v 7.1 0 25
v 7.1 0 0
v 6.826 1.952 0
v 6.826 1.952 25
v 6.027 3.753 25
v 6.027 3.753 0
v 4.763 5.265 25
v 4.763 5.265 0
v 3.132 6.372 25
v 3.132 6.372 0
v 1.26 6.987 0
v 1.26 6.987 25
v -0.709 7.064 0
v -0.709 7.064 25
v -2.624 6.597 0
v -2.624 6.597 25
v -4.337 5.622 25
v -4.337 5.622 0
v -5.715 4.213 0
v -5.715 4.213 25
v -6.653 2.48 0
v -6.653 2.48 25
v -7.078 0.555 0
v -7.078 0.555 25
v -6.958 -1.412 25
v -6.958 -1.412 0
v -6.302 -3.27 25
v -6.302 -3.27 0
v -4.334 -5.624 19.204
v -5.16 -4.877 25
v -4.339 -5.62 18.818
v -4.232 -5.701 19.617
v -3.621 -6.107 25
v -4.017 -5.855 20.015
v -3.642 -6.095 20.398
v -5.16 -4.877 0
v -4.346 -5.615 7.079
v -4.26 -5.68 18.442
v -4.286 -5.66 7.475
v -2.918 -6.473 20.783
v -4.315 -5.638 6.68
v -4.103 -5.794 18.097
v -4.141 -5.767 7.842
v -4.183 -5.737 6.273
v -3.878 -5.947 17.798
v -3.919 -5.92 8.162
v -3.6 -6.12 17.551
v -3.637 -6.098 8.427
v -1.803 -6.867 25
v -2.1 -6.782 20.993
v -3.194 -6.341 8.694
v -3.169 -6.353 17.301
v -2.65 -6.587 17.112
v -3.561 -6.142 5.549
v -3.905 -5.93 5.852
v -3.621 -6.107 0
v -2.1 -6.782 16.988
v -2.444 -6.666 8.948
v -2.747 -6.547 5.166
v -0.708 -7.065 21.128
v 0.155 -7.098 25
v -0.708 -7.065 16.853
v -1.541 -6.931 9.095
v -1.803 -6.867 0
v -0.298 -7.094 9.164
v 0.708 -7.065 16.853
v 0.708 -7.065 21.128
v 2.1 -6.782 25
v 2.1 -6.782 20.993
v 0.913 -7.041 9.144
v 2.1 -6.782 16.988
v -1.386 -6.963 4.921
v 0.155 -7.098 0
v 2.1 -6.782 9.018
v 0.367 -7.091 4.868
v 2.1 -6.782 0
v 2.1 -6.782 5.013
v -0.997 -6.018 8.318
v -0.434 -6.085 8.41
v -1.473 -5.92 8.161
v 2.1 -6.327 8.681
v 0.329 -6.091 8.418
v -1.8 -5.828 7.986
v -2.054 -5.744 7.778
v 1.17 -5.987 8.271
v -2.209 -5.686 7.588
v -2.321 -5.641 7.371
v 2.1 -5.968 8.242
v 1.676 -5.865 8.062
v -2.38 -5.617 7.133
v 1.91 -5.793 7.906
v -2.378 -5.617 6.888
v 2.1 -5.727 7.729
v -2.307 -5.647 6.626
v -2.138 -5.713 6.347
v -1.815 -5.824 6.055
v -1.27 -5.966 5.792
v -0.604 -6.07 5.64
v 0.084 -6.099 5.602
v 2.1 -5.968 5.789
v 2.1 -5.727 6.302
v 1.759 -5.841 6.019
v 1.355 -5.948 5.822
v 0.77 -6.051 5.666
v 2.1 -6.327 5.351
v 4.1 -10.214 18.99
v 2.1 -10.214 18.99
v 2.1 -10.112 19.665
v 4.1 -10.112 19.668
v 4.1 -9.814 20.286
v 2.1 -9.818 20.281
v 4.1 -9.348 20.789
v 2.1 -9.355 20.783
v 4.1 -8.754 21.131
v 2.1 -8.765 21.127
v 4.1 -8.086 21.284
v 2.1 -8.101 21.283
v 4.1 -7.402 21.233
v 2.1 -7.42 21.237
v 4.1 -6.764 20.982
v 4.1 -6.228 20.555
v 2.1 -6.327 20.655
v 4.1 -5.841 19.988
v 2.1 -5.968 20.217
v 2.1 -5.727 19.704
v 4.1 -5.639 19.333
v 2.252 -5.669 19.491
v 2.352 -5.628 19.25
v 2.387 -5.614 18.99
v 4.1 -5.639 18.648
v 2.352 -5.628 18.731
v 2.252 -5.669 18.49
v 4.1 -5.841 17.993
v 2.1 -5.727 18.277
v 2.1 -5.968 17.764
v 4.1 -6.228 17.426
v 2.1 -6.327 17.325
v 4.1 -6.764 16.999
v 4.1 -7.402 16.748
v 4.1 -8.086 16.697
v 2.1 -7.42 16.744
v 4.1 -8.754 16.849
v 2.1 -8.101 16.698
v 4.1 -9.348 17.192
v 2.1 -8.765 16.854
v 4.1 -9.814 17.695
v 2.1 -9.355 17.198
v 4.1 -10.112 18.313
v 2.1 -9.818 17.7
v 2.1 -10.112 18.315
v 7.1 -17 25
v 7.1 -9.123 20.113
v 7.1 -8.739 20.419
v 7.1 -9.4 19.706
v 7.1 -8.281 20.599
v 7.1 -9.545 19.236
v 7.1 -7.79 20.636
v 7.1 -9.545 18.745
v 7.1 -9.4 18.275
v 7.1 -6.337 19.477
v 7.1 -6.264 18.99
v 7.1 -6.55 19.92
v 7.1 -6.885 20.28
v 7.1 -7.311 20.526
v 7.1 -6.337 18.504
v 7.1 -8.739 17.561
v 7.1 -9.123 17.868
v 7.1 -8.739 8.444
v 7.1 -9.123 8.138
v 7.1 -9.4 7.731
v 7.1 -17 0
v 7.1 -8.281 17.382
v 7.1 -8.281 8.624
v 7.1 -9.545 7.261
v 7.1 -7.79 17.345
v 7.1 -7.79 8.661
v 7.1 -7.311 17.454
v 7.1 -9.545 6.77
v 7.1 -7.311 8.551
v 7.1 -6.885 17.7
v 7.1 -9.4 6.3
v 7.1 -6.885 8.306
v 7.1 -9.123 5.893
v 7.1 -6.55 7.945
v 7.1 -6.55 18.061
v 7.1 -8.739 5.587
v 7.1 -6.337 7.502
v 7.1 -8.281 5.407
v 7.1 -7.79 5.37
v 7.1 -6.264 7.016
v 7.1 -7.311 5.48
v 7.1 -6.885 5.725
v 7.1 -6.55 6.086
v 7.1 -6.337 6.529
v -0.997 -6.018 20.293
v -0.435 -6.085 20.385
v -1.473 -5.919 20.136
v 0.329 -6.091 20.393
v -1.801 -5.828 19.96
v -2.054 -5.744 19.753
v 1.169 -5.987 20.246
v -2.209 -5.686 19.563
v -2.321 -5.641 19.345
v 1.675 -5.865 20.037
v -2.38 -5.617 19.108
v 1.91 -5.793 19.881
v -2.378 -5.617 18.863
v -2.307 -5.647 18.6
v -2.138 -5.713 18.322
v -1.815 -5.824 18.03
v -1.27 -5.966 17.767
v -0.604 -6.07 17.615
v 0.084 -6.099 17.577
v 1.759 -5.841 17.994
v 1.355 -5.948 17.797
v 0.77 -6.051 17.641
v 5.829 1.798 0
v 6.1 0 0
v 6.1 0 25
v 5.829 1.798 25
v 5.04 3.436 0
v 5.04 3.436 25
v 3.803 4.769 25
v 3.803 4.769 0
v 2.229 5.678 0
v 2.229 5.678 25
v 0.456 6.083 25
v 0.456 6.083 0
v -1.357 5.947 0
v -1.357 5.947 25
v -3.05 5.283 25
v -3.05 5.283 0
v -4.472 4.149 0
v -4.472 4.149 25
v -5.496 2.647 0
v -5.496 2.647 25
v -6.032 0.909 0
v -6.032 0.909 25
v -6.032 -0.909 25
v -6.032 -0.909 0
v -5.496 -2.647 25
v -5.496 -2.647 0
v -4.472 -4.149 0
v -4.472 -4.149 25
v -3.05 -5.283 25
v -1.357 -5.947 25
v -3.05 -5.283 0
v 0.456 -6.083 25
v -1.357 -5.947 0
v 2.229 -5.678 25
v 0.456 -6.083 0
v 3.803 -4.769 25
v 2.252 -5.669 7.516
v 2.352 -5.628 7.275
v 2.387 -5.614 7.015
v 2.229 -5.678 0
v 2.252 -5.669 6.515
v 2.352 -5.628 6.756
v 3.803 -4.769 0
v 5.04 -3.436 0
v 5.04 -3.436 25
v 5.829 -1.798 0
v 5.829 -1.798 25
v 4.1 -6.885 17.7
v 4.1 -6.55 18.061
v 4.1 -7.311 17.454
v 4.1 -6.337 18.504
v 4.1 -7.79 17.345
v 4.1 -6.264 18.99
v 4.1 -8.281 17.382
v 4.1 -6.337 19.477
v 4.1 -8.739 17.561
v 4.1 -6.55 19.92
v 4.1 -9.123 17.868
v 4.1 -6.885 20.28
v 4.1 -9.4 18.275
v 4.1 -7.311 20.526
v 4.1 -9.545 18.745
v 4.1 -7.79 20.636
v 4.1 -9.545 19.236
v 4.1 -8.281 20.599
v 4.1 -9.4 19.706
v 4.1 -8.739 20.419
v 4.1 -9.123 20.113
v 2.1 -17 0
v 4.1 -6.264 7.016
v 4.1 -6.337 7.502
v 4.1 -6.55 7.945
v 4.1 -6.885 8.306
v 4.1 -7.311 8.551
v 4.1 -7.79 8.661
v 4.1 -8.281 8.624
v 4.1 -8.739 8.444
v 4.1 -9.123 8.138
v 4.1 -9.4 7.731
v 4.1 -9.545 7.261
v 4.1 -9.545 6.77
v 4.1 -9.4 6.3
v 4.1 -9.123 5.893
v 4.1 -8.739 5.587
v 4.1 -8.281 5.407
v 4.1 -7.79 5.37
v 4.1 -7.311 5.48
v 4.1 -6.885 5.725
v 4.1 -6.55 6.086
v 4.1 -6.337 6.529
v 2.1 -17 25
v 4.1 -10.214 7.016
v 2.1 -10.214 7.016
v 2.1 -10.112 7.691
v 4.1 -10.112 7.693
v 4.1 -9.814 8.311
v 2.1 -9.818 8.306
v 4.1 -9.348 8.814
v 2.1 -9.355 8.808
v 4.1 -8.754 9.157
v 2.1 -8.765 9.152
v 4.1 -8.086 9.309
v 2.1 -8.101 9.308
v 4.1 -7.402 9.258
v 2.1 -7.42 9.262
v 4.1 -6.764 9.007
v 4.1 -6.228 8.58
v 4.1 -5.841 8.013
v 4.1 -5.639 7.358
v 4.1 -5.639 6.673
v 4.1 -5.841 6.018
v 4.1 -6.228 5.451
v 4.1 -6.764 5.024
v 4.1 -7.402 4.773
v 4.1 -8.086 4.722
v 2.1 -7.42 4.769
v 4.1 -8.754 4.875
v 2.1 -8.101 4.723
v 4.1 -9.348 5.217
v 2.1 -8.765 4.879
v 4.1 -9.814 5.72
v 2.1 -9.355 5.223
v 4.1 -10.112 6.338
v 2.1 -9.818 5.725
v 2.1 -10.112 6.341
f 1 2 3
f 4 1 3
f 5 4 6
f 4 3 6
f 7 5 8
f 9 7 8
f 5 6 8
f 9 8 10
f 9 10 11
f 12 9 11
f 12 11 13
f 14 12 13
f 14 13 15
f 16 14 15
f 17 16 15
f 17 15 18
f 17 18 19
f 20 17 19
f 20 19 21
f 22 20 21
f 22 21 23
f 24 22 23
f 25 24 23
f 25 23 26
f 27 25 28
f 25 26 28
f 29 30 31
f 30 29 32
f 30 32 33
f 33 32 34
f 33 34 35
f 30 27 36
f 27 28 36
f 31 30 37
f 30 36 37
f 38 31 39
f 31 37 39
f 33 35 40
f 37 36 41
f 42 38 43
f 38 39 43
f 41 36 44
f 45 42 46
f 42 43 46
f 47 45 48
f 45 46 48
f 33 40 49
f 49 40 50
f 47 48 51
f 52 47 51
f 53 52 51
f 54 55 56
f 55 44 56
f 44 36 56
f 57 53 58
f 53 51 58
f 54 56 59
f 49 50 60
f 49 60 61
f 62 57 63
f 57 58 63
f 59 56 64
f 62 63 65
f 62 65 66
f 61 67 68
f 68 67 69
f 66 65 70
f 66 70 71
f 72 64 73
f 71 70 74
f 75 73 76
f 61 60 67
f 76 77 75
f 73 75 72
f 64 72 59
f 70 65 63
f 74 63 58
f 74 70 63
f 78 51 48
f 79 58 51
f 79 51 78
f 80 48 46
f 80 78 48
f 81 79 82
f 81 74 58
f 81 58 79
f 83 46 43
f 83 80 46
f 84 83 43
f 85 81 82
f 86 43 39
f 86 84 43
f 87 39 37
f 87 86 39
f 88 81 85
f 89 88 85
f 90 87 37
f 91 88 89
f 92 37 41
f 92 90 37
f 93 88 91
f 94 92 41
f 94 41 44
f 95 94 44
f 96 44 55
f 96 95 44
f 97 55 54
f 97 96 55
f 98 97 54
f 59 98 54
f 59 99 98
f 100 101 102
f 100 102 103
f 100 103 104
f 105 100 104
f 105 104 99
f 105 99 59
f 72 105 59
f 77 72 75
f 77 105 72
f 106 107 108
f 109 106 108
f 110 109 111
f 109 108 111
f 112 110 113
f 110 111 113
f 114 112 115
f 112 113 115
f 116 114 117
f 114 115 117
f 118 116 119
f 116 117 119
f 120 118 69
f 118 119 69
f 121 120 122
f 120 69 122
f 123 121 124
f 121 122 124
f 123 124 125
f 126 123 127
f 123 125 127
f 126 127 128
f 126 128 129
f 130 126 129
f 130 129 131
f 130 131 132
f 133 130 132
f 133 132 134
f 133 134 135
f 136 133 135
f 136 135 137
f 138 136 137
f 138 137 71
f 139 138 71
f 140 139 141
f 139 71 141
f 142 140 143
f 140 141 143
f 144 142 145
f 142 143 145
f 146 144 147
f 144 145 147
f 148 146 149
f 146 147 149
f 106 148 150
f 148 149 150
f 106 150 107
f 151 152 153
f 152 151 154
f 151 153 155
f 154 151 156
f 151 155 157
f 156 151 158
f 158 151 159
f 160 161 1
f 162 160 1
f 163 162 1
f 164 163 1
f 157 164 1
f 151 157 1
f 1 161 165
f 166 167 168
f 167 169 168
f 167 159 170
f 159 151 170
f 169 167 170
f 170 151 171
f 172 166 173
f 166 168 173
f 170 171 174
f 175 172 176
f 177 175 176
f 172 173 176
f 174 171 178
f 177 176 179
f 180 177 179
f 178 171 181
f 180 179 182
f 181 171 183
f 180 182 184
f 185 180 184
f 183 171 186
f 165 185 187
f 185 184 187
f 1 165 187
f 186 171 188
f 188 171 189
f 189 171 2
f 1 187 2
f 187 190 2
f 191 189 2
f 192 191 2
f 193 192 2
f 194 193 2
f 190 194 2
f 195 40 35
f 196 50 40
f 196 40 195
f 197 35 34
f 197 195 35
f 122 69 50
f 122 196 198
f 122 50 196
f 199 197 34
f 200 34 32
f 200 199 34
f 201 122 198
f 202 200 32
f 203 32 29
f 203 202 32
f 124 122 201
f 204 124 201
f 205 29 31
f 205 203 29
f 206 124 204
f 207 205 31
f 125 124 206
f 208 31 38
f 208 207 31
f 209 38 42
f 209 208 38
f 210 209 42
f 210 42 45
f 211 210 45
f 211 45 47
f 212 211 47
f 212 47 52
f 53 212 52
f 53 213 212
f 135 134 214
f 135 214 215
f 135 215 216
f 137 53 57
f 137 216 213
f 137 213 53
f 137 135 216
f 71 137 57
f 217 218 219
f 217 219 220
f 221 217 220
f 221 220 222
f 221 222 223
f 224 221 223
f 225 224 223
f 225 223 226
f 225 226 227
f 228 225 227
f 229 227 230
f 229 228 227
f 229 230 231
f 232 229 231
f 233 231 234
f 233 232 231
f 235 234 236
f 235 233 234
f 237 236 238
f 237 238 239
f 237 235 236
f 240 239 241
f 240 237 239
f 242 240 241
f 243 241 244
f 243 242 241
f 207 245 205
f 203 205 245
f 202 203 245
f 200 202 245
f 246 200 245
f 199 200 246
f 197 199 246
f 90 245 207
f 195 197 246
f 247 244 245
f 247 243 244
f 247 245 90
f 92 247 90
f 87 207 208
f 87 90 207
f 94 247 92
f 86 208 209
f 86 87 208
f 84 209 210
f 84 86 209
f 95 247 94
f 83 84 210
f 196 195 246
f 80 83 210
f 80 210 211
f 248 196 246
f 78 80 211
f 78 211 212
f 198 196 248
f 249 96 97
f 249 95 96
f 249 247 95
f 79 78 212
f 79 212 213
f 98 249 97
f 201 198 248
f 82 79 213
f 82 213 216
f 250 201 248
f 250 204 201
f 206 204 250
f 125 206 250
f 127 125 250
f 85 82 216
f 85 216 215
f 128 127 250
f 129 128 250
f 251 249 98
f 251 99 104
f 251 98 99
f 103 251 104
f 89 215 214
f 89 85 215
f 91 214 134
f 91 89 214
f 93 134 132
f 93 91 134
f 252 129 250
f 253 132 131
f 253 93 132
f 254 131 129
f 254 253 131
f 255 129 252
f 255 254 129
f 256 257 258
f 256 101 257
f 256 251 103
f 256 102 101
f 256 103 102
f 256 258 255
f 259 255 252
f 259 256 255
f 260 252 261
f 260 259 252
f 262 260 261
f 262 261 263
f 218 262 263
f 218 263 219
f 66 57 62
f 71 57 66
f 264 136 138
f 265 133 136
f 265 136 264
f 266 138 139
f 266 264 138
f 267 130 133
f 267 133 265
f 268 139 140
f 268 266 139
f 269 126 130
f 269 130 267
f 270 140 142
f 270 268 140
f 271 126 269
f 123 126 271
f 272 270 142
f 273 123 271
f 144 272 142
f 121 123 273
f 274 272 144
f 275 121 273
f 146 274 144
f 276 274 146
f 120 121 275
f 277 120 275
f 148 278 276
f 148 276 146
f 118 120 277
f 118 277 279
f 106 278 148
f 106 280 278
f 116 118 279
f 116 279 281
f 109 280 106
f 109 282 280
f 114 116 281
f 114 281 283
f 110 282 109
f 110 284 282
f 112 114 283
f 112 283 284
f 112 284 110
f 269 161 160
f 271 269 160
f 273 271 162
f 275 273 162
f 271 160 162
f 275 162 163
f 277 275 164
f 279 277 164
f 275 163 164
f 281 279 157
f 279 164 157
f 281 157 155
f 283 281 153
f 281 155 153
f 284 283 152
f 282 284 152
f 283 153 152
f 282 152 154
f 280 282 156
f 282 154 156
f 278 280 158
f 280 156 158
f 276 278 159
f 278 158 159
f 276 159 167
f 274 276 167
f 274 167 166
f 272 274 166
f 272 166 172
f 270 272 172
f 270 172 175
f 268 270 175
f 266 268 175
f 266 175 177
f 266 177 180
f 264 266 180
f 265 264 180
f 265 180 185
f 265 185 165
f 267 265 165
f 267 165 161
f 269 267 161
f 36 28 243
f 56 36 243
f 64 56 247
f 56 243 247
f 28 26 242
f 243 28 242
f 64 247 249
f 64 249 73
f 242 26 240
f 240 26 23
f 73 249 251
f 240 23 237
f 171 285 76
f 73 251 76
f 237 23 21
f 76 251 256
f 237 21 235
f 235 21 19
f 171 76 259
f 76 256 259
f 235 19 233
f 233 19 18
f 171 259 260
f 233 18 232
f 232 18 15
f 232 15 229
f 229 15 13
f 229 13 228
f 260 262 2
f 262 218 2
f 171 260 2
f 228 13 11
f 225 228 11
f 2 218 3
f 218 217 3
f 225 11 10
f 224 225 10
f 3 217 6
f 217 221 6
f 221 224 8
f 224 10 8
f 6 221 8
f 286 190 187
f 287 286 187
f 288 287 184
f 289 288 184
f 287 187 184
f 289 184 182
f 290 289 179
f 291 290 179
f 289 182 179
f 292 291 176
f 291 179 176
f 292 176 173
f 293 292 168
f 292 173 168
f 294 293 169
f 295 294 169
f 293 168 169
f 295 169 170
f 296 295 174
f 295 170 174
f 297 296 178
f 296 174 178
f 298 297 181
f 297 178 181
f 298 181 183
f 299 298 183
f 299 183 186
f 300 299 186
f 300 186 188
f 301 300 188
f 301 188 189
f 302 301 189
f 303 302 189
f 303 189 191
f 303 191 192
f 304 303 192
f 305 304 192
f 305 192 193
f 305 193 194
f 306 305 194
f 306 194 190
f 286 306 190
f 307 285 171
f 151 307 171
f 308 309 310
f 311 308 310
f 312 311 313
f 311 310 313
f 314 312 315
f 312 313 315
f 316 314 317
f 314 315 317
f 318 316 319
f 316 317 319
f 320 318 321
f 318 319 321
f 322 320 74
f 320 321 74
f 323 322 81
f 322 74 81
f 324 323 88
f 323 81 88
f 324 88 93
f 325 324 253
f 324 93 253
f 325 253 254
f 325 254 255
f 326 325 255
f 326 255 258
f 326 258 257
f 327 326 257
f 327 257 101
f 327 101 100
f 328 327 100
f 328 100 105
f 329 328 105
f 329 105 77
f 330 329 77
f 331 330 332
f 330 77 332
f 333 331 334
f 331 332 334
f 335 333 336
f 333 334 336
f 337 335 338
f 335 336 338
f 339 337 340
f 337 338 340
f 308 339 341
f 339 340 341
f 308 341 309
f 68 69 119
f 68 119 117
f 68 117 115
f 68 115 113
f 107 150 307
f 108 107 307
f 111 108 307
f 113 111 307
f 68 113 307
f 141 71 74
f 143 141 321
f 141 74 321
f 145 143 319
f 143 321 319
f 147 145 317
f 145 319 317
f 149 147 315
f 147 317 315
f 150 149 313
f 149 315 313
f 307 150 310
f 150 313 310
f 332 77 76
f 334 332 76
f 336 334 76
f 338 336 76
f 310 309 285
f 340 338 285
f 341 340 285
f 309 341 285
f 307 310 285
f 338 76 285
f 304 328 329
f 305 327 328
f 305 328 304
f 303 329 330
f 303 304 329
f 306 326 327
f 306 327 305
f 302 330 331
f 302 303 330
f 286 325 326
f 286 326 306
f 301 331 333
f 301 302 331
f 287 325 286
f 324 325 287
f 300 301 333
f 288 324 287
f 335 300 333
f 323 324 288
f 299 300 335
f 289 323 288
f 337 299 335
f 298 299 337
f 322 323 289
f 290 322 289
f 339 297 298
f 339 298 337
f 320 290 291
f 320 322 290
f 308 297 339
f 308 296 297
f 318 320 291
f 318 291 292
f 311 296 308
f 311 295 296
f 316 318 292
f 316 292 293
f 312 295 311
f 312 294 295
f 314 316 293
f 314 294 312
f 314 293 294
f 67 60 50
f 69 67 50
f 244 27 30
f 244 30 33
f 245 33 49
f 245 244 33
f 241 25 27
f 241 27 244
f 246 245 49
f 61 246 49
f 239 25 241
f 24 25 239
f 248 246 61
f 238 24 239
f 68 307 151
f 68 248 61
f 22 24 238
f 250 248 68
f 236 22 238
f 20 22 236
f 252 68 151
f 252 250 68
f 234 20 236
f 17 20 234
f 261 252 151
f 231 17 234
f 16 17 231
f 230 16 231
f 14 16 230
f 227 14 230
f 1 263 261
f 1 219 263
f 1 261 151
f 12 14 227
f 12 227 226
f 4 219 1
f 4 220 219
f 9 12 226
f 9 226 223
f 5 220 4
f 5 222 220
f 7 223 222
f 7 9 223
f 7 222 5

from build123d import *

# Parameters (mm, degrees)
F0_R     = 6.1
F1_DEPTH = 25
F2_R     = 2.3
F3_DEPTH = 25
F4_DEPTH = 2
F5_D     = 3.3


with BuildPart() as f1:
    # F0 (on Top) → F1 (new body)
    with BuildSketch(Plane.XY):
        with BuildLine():
            ThreePointArc((2.1, -6.7823299831), (5.7148928249, -4.2130748866), (7.1, 0))
            ThreePointArc((7.1, 0), (-5.7148928249, 4.2130748866), (2.1, -6.7823299831))
        make_face()
        Circle(F0_R, mode=Mode.SUBTRACT)
        with BuildLine():
            Line((7.1, -17), (7.1, 0))
            ThreePointArc((7.1, 0), (5.7148928249, -4.2130748866), (2.1, -6.7823299831))
            Line((2.1, -6.7823299831), (2.1, -17))
            Line((2.1, -17), (7.1, -17))
        make_face()
    extrude(amount=F1_DEPTH)

    # F2 (on face) → F3 (cut)
    with BuildSketch(Plane(origin=(2.1, 0, 0), x_dir=(0, -1, 0), z_dir=(-1, 0, 0))):
        with BuildLine():
            ThreePointArc((6.7823299831, 16.9879498806), (9.0729868094, 17.0039599884), (10.2137183353, 18.9904384315))
            ThreePointArc((10.2137183353, 18.9904384315), (9.0729868094, 20.9769168746), (6.7823299831, 20.9929269824))
            Line((6.7823299831, 20.9929269824), (6.7823299831, 16.9879498806))
        make_face()
        with Locations((7.9137183353, 18.9904384315)):
            Circle(F2_R)
        with Locations((7.9137183353, 7.0155123249)):
            Circle(F2_R)
    extrude(amount=F3_DEPTH, mode=Mode.SUBTRACT)

    # F2 (on face) → F4 (cut)
    with BuildSketch(Plane(origin=(2.1, 0, 0), x_dir=(0, -1, 0), z_dir=(-1, 0, 0))):
        with Locations((7.9137183353, 18.9904384315)):
            Circle(F2_R)
        with Locations((7.9137183353, 7.0155123249)):
            Circle(F2_R)
    extrude(amount=-F4_DEPTH, mode=Mode.SUBTRACT)

    # F5 (through all)
    with Locations(Plane(origin=(2.1, 0, 0), x_dir=(0, -1, 0), z_dir=(-1, 0, 0))):
        with Locations((7.9137183353, 7.0155123249), (7.9137183353, 18.9904384315)):
            Hole(F5_D / 2)


solid = f1.part
